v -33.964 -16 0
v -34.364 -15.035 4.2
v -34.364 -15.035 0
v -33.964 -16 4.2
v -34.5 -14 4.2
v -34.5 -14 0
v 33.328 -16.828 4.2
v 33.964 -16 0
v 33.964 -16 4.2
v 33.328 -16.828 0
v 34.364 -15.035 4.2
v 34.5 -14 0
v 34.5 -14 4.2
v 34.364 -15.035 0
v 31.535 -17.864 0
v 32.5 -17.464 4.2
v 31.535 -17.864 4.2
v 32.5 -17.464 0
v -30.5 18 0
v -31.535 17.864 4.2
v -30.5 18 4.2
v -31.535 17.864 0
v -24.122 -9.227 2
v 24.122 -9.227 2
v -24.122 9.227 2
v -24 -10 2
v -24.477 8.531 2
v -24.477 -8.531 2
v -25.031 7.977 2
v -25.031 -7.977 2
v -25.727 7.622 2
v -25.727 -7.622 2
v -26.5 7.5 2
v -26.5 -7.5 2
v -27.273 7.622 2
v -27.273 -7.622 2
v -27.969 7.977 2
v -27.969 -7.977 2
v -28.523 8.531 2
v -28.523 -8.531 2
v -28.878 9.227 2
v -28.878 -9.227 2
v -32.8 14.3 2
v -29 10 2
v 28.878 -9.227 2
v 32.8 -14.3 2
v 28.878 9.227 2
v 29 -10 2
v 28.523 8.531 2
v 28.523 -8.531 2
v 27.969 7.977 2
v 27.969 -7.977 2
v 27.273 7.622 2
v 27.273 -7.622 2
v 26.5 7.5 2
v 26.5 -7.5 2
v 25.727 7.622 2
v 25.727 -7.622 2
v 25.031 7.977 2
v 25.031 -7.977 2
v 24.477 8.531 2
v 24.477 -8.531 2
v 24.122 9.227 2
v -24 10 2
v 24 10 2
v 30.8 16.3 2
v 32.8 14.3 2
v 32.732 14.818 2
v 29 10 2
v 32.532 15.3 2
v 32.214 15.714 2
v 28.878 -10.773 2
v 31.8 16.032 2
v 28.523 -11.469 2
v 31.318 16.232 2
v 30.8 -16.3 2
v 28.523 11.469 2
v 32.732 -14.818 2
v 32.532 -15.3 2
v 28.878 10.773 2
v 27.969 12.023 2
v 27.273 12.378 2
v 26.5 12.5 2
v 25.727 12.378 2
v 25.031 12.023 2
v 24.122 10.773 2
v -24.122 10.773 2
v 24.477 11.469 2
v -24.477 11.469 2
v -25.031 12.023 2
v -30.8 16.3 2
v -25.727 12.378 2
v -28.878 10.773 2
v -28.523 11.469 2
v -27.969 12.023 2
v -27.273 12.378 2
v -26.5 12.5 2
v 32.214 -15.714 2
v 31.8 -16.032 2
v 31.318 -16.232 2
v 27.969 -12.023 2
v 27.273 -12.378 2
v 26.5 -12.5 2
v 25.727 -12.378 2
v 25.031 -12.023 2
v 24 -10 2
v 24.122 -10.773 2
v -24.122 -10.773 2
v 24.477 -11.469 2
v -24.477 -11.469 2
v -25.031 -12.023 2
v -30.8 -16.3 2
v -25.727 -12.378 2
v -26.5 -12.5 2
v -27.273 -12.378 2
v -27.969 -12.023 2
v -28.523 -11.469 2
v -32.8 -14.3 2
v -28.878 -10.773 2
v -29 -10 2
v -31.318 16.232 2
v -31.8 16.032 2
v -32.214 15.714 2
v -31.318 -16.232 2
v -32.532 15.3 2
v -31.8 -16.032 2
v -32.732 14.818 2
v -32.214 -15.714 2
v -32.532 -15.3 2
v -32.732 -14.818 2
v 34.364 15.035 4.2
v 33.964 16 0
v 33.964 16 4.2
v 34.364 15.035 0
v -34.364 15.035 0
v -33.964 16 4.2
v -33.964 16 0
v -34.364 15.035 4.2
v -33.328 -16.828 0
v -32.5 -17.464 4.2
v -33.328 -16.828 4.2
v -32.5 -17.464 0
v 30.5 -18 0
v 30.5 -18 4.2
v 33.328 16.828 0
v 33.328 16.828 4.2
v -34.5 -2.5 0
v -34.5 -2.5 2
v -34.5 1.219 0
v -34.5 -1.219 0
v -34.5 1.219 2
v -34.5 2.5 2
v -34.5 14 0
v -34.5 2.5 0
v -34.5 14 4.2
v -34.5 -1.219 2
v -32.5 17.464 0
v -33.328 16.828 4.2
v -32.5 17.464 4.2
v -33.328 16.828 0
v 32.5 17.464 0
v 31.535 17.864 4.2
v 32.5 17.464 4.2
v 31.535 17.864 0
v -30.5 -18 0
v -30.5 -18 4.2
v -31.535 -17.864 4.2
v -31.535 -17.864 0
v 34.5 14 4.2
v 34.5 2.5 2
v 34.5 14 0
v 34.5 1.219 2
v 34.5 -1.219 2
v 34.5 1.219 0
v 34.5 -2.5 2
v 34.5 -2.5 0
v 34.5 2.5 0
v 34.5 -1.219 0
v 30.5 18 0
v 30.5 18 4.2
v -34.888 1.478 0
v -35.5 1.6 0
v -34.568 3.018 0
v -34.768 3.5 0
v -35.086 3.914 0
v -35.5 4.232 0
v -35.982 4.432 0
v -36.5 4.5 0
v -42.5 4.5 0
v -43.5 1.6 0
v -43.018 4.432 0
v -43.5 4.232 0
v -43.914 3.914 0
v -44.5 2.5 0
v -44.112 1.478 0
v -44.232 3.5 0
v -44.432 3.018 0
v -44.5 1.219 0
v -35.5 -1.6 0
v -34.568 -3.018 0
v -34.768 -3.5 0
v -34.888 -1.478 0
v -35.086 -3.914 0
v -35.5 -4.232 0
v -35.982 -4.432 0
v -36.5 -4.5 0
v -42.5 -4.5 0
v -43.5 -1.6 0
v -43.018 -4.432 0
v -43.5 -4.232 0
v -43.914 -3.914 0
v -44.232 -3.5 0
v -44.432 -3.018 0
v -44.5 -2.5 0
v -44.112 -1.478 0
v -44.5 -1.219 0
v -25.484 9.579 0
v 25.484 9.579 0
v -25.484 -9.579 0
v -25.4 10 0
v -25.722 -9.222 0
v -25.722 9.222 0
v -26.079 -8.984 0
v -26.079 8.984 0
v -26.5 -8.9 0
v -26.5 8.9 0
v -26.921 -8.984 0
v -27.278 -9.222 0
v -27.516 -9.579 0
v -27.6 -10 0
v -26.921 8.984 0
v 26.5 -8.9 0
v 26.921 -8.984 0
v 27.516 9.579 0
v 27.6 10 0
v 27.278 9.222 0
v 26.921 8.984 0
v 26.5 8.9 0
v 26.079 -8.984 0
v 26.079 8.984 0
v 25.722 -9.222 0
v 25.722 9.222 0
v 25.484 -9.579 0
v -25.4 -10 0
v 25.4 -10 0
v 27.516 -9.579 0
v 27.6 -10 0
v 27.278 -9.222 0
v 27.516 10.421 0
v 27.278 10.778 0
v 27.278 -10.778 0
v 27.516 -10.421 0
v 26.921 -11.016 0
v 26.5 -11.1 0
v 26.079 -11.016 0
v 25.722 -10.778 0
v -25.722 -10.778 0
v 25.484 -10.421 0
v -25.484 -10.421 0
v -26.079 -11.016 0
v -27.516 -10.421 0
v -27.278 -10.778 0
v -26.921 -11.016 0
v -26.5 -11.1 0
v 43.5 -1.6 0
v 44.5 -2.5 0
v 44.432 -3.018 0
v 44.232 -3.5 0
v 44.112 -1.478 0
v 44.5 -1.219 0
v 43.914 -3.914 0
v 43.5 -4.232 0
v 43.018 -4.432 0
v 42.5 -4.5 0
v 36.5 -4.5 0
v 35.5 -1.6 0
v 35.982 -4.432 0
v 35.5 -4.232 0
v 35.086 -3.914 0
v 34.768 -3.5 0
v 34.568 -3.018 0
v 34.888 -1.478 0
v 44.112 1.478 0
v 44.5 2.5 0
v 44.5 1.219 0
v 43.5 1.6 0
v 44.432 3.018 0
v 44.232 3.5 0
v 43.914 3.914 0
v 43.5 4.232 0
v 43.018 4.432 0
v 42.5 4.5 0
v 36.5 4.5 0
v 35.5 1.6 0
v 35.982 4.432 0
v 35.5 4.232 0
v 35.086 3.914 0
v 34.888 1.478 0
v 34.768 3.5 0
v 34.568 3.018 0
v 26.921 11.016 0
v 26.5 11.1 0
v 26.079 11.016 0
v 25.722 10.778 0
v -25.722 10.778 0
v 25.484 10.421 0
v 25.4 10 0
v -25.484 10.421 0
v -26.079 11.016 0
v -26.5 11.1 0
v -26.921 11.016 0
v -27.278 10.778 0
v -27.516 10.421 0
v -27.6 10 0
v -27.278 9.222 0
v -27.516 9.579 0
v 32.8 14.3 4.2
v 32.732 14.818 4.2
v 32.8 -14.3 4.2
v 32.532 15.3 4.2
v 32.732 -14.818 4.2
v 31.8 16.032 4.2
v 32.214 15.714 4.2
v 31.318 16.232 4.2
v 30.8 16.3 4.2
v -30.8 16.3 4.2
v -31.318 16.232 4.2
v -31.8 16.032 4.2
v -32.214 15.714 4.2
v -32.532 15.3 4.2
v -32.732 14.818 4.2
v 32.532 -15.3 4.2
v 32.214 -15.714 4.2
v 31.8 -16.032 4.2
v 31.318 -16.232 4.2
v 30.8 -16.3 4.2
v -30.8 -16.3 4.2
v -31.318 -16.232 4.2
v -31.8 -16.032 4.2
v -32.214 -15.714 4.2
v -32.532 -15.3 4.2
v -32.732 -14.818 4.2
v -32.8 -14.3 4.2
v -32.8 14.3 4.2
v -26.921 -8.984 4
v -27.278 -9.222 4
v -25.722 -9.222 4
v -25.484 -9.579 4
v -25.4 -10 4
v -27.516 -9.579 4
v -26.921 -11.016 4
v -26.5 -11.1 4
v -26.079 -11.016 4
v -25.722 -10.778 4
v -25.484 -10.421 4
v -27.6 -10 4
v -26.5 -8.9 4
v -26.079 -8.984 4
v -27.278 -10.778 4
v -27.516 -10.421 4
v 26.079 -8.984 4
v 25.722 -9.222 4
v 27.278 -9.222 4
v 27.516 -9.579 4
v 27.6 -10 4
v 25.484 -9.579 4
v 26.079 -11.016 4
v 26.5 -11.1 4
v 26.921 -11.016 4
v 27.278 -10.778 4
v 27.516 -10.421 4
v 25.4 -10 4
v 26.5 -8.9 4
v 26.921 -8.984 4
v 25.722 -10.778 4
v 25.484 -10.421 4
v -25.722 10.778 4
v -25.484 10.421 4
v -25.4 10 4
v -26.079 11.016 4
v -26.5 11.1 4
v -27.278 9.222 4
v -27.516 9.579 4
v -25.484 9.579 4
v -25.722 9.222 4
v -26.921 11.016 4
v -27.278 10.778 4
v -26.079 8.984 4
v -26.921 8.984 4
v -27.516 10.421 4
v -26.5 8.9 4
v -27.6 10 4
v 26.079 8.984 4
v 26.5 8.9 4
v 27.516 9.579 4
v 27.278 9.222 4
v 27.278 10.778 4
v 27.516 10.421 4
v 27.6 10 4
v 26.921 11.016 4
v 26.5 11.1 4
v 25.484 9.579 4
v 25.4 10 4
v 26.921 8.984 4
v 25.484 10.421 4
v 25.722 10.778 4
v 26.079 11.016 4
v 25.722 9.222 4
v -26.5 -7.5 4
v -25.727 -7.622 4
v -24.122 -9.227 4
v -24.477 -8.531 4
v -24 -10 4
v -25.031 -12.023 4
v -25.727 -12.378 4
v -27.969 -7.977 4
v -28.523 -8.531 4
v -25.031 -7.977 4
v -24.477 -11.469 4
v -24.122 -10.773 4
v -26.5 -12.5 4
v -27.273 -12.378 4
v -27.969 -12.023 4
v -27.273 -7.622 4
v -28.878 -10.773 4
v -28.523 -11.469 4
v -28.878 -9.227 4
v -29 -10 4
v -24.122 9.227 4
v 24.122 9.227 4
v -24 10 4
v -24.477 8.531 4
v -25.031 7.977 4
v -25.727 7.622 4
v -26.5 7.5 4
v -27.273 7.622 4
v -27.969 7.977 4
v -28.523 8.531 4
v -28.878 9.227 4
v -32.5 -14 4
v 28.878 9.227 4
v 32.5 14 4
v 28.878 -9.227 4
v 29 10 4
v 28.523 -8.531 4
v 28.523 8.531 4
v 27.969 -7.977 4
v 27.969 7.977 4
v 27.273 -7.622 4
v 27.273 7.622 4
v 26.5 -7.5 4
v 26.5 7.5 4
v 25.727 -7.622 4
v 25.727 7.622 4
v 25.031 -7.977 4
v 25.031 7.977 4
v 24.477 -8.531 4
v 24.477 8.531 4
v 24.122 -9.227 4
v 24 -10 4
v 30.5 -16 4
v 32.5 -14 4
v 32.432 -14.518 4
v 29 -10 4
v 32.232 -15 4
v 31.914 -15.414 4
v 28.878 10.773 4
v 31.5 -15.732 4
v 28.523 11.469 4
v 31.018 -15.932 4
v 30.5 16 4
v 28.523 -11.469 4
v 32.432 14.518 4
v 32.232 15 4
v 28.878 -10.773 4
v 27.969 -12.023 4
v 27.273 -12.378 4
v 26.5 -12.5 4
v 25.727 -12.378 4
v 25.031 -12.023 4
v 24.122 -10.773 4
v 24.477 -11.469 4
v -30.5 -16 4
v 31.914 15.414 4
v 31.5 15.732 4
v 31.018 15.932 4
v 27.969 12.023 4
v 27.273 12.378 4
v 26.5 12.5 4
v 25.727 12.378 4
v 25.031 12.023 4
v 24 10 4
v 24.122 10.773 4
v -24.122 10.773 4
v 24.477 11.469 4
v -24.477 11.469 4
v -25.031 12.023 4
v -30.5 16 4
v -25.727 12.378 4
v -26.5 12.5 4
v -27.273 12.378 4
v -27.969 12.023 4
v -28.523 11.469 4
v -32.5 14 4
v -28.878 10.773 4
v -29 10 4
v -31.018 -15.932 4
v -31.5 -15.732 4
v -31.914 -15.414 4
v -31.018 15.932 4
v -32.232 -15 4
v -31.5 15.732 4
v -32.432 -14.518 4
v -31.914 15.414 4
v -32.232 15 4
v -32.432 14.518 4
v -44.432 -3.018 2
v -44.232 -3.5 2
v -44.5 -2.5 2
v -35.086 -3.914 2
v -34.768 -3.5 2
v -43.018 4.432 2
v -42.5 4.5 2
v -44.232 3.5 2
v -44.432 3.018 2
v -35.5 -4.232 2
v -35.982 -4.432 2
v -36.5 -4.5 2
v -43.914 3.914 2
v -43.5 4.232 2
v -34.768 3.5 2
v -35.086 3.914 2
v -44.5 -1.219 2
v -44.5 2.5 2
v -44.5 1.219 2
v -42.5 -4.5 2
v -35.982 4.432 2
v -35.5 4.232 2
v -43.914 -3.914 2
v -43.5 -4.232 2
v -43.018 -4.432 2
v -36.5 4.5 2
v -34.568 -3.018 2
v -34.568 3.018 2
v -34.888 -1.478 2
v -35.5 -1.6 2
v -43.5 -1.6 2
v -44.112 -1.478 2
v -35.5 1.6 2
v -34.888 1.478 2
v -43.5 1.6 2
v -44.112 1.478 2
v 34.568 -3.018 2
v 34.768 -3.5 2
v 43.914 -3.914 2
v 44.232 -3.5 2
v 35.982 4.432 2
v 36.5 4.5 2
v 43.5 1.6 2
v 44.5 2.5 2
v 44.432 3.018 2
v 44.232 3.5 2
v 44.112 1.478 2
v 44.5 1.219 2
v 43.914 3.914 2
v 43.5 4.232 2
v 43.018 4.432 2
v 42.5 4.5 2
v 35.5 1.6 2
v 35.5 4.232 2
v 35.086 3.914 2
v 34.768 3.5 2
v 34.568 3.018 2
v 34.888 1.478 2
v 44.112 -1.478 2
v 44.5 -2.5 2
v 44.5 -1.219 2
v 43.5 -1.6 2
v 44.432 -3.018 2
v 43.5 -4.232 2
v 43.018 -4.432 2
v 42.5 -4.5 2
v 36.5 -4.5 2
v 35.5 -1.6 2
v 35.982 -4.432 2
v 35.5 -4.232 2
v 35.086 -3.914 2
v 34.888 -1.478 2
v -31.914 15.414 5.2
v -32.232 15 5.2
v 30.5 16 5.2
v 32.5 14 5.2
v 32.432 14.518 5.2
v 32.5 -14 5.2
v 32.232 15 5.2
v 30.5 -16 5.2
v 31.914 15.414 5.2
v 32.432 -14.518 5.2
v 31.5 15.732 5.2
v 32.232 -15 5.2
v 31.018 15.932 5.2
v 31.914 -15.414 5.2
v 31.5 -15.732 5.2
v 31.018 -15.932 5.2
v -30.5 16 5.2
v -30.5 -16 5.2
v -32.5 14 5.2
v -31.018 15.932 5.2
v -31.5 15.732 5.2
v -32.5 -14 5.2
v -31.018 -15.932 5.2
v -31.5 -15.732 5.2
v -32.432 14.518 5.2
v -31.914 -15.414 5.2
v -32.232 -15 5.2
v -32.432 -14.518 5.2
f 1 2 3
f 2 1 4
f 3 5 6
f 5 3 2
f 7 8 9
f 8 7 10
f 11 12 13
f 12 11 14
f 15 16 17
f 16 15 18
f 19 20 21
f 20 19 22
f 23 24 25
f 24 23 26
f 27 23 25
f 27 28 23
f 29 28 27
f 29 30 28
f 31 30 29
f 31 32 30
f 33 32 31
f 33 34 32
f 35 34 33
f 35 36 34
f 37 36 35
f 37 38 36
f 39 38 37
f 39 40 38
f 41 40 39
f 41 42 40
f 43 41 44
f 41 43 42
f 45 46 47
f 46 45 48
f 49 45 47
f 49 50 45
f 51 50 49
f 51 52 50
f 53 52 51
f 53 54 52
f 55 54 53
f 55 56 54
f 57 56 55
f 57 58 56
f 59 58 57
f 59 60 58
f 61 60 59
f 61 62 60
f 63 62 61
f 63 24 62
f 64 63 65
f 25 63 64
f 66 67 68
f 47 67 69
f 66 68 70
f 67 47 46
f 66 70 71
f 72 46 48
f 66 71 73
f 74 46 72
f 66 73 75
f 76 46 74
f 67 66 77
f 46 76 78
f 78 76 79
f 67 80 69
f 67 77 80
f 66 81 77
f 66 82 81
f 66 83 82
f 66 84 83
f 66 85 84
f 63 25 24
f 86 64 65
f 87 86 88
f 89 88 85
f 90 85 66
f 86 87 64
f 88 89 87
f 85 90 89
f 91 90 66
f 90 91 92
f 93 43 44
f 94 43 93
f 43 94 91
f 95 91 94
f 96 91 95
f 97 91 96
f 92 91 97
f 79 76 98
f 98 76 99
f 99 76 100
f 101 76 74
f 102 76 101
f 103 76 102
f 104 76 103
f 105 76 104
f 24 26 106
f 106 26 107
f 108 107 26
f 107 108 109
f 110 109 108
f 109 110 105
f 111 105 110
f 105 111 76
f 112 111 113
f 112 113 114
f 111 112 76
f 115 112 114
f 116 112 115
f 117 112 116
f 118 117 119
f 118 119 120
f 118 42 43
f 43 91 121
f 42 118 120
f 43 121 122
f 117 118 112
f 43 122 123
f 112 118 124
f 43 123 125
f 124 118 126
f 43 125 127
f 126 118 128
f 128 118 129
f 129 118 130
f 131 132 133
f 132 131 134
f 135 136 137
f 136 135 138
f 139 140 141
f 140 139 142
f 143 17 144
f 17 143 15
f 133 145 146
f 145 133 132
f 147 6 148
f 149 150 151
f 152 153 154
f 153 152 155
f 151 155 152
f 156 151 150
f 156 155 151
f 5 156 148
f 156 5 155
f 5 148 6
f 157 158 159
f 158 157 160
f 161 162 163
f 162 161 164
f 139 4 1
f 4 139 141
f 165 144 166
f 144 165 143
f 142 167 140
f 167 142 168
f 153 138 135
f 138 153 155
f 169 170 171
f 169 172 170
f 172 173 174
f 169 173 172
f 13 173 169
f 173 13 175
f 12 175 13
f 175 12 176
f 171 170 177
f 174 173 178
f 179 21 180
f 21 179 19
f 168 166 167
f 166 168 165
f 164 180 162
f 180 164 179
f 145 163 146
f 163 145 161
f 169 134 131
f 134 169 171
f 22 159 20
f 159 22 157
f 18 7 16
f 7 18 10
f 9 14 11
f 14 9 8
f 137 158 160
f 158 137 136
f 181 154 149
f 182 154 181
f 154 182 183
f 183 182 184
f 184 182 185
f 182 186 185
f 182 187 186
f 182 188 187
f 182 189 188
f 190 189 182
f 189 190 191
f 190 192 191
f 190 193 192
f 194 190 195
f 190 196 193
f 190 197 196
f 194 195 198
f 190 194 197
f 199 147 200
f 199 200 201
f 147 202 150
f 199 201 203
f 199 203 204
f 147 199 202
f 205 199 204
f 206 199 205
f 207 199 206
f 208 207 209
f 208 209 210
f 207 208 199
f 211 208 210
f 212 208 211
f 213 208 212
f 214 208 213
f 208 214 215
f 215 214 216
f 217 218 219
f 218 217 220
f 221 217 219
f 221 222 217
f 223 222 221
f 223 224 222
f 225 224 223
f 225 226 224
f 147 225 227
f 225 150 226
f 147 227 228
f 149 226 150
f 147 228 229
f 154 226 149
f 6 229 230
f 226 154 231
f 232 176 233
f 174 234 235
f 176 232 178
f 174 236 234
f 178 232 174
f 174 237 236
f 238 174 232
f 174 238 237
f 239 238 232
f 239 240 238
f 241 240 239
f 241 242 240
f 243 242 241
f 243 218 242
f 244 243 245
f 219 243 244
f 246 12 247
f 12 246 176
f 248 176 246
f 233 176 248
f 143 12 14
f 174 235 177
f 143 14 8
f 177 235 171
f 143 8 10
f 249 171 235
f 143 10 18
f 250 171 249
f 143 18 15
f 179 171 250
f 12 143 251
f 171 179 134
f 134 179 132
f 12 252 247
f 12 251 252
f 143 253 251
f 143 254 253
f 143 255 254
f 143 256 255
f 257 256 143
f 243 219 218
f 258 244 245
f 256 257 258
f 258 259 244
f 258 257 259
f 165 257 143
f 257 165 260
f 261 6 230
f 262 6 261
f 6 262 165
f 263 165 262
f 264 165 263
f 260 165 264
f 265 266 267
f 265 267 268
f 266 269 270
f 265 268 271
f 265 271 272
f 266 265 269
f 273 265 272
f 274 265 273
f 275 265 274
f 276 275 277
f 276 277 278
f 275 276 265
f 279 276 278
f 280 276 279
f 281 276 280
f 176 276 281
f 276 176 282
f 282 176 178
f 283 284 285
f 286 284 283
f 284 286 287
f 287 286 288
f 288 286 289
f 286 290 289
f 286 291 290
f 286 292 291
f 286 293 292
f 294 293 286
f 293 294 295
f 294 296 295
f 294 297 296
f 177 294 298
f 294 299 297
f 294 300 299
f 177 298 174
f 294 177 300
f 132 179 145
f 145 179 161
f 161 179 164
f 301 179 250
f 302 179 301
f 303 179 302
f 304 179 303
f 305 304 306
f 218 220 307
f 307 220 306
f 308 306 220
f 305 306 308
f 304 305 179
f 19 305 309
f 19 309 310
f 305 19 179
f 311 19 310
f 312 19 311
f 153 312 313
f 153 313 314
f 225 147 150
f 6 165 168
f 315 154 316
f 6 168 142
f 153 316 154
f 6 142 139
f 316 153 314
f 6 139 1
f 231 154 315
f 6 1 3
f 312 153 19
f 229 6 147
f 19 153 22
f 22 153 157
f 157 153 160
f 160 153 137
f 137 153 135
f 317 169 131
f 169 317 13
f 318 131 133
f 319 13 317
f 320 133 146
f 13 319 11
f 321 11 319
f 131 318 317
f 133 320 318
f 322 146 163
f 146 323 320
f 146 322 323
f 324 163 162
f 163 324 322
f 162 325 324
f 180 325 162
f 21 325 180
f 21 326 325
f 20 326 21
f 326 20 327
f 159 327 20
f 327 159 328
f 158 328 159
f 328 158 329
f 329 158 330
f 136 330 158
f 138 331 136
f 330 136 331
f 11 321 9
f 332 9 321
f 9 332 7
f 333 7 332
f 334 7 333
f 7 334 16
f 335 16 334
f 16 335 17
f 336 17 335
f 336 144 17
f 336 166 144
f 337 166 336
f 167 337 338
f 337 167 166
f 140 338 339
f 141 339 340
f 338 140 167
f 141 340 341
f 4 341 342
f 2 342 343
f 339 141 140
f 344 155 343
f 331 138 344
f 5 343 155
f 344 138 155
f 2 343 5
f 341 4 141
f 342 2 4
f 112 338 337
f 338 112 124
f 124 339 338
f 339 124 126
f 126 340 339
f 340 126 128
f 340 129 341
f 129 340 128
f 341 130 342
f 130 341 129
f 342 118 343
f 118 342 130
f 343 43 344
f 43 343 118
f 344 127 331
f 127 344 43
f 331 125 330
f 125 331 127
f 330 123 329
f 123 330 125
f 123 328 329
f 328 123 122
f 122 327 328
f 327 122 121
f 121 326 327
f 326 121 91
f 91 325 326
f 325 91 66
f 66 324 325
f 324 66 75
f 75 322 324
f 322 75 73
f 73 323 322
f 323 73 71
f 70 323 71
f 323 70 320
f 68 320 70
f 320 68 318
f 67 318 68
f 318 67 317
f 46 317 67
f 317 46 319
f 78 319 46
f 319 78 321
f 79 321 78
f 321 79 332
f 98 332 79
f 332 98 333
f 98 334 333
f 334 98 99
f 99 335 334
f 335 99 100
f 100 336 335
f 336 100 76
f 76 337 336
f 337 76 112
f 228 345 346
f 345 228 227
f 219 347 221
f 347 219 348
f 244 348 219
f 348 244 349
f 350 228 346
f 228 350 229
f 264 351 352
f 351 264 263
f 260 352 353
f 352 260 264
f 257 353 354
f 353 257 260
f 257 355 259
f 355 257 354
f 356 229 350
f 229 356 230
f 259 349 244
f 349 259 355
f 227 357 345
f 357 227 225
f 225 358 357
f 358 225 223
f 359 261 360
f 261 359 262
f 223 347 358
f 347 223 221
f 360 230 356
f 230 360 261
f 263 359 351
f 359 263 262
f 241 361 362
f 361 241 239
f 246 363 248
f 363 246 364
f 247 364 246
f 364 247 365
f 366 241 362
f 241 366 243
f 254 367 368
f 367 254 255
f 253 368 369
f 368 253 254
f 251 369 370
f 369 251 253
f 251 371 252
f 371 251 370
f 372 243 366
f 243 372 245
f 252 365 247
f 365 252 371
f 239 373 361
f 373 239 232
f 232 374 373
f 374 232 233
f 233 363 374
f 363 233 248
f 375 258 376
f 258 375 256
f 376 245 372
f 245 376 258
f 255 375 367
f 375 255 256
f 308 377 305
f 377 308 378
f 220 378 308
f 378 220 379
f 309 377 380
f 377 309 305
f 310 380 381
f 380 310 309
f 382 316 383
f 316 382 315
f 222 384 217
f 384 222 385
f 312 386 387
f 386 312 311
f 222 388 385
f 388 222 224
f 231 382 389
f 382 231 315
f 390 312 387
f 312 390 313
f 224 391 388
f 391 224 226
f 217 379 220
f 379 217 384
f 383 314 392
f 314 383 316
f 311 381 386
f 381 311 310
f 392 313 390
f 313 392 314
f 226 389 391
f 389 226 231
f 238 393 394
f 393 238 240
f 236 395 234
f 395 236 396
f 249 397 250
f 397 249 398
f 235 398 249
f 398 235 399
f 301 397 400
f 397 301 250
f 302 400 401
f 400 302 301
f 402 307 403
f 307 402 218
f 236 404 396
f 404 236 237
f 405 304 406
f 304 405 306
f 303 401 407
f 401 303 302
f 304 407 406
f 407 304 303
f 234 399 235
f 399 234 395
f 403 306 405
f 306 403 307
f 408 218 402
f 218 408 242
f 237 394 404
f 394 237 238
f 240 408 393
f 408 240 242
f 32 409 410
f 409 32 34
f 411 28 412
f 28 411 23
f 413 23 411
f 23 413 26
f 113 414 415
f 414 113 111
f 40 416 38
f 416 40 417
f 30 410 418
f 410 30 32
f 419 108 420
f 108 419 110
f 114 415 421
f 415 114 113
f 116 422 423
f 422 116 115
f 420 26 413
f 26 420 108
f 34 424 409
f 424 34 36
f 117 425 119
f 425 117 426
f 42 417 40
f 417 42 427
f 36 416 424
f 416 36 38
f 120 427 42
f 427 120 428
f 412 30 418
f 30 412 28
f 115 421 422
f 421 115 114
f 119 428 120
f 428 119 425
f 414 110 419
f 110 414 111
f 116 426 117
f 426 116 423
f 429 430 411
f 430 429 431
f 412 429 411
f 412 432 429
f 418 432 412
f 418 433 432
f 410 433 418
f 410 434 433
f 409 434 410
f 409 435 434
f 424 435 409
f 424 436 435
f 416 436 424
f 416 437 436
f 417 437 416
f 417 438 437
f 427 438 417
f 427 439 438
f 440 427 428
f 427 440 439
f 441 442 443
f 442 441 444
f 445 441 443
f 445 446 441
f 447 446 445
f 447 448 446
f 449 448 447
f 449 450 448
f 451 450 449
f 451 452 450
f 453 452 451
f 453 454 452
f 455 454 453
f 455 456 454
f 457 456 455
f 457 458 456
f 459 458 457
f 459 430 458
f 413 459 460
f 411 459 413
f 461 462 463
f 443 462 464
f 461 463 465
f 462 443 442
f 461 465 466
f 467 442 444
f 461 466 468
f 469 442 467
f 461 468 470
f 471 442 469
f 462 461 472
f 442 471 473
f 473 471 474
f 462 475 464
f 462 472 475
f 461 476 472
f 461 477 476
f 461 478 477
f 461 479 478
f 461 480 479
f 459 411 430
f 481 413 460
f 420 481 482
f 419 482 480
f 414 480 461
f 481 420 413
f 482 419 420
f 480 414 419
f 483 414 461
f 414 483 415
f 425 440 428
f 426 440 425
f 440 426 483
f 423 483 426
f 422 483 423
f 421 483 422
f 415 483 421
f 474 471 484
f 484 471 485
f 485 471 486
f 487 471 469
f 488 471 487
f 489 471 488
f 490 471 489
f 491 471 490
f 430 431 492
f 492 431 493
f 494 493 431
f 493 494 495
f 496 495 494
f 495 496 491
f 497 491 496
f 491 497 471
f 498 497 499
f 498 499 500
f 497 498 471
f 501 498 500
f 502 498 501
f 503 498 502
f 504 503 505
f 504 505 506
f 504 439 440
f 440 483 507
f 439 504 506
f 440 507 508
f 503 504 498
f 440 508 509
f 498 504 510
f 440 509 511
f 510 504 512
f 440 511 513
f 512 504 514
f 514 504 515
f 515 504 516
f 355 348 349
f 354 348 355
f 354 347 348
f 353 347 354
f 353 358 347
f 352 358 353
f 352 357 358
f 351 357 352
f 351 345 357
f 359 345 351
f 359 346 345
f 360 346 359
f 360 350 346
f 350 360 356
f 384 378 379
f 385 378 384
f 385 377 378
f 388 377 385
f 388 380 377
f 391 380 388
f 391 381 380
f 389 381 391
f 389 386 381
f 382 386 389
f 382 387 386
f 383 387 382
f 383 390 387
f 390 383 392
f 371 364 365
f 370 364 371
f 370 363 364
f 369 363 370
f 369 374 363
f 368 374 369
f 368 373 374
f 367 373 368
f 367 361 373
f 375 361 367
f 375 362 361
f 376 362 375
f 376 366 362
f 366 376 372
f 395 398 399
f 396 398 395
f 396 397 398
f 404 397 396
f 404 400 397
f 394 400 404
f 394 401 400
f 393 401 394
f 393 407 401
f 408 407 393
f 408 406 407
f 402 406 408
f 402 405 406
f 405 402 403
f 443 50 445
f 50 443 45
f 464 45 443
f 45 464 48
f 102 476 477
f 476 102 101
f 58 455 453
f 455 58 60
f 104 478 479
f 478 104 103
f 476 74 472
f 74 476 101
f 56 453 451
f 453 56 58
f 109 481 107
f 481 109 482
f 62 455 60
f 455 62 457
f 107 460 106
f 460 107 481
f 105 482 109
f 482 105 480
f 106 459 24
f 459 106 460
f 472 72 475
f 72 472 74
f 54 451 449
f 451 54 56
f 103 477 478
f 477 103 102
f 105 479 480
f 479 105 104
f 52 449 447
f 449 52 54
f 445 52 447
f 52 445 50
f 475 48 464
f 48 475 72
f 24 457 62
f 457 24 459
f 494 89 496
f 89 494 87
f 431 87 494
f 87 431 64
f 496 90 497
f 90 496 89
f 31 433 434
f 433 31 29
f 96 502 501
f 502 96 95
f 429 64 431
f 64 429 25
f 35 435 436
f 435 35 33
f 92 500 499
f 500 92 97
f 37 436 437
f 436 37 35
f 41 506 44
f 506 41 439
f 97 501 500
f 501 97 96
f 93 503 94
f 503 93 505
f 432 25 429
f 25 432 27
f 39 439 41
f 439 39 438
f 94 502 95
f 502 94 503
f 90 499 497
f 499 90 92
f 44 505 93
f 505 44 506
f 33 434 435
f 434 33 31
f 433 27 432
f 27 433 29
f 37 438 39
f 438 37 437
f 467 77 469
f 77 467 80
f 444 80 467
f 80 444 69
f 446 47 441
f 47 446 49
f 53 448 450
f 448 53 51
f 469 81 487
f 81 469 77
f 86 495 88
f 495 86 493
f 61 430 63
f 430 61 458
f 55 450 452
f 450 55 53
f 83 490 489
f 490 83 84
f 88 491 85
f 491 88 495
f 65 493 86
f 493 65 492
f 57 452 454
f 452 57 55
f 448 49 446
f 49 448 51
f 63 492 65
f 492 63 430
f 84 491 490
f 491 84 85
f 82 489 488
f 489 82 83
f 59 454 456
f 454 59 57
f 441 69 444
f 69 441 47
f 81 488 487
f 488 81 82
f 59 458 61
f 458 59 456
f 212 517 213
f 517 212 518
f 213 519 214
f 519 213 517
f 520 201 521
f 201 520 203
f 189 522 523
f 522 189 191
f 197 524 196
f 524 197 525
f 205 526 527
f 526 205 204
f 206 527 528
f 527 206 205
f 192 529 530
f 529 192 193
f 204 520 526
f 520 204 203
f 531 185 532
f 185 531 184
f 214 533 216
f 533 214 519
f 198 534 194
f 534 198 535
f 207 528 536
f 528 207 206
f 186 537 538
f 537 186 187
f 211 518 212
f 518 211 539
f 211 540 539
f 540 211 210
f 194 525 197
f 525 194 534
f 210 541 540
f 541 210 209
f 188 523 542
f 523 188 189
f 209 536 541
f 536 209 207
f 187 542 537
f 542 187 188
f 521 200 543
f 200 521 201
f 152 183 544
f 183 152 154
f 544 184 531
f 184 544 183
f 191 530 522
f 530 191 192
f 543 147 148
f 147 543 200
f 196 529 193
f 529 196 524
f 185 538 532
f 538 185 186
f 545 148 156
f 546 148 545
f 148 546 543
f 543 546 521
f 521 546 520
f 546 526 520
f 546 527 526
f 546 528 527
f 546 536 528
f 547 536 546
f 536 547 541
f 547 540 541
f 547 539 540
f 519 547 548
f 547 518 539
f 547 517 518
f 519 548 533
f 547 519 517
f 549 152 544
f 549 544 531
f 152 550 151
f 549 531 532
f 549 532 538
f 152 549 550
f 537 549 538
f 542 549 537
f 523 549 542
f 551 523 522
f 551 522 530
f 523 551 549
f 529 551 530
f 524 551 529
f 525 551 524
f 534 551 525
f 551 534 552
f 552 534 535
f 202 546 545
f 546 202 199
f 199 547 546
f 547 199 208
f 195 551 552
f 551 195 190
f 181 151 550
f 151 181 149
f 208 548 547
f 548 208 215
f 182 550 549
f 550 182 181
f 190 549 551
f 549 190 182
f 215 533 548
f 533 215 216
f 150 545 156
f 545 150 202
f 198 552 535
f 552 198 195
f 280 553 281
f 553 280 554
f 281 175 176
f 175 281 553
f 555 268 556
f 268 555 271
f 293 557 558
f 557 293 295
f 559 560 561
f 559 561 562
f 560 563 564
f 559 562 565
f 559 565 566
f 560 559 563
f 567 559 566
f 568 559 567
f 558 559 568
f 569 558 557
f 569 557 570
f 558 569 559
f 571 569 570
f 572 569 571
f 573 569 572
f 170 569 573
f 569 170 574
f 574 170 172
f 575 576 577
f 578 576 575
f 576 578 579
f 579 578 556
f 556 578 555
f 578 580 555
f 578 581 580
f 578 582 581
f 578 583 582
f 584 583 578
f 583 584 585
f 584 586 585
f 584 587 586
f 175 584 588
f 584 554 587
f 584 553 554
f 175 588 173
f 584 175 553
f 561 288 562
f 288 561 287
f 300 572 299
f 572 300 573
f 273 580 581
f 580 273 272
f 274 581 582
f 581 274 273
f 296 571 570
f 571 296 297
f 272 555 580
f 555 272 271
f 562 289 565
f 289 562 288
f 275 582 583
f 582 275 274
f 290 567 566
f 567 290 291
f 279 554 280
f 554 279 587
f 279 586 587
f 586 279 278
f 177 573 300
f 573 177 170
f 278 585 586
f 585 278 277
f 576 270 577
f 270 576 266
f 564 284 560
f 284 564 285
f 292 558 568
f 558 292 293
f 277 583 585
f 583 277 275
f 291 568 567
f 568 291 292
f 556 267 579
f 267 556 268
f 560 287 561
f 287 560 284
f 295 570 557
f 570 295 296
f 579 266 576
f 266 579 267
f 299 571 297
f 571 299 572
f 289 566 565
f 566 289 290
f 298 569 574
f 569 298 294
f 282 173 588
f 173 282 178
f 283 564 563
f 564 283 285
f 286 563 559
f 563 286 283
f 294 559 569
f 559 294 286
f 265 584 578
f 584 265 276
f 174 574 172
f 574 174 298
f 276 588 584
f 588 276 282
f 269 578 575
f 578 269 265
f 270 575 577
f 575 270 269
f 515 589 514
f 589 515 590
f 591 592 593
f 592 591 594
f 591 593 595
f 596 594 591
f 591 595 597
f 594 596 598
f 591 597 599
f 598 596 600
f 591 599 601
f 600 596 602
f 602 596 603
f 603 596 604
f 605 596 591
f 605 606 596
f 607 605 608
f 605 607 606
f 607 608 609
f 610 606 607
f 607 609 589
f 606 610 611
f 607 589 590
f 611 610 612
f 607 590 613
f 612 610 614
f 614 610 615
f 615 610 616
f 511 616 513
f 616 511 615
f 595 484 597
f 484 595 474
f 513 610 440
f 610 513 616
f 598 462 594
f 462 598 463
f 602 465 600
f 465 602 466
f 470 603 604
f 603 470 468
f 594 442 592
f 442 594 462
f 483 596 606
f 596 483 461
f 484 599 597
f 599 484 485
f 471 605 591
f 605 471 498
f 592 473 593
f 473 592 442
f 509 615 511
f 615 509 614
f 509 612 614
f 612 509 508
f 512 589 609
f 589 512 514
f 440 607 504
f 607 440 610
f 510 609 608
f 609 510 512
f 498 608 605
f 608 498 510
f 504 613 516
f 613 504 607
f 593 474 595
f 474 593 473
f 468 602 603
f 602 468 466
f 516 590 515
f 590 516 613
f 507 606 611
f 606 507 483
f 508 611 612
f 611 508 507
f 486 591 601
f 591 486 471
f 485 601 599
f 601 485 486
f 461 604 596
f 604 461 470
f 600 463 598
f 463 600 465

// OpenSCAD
// ============================================================================
// Orange Pi Zero 3W 载板 / 托架  —  参数化 OpenSCAD 源
// ============================================================================
// 性质: 本仓"从零自建"的新零件, 不修改 fanhao375/microduck-replica-cad 的
//       原始 SolidWorks/STEP (本机也无 SW/FreeCAD). 输出 .scad -> OpenSCAD 渲染 -> STL 可打印.
//
// 板尺寸来源: 香橙派官网参数页 (orangepi.cn/.../Orange-Pi-Zero-3W.html)
//   PCB 65 x 32 x 1.2 mm. 英文详情页有一处写 "30mm x 65mm", 以参数页 65x32 为准,
//   该 2mm 差异列为待核对项.
//
// 用途: 替代飞特版 (v2.2) 原本按 Raspberry Pi Zero 2W 做的机内托架, 把 Orange Pi
//       Zero 3W (A733) 固定到 MicroDuck 机身. 飞特版原托架按 RPi 引脚/板型建模,
//       与 Orange Pi 不兼容, 故重建.
//
// 重要接口警告 (已反复确认):
//   Orange Pi 的 40-pin 不是 Raspberry Pi 引脚定义 -> 之前方案里的 "RPi 形态 HAT
//   (kissqy / DuckBuddy)" 在引脚上不 drop-in. 这块载板按 "直接固定 + 飞线/转接载板"
//   思路做, 不预设原 HAT 能插上. 是否保留 HAT 由后续硬件决策定.
//
// 待核对 / 待定 (改前必须确认, 见文件末尾 CHECKLIST):
//   1. 板角倒圆半径 BOARD_R (官网未给, 暂估 2.0)
//   2. 真实安装孔位 (本件用四角内缩支柱, 非官方孔位; Pi Zero 兼容孔位待核)
//   3. 载板与机身的螺接接口 (lugs 位置/数量) 需对照飞特版躯干结构 STEP 后定
//   4. 各接插件 (Mini HDMI / USB-C / TF / CSI FPC / PCIe FPC / 风扇) 的精确位置
// ============================================================================

// ---------- 板参数 (官方, 已核对) ----------
BOARD_L = 65.0;   // X 方向长度 mm
BOARD_W = 32.0;   // Y 方向宽度 mm
BOARD_T = 1.2;    // 板厚 mm
BOARD_R = 2.0;    // 板角倒圆 (估算, 待核对官方顶视图)

// ---------- 载板参数 (可调) ----------
wall    = 2.0;    // 边框壁厚
base_t  = 2.0;    // 底板厚
rail_h  = BOARD_T + 1.0;  // 定位边轨高 (仅包住板边, 不挡顶部接插件)
stand_h = 2.0;    // 支柱高 (板底离底板)
screw_d = 2.2;    // M2 通孔直径 (间隙)
tol     = 0.3;    // 板与框配合间隙

// 坐标系: 板中心在原点 (rounded_rect 以原点为中心), 故 standoffs/lugs 用 ±半宽.
// 支柱位置: 四角内缩 6mm. 真实安装孔位待核对 (Pi Zero 兼容 or 官方顶视图)
standoffs = [
  [ -(BOARD_L/2 - 6.0), -(BOARD_W/2 - 6.0) ],
  [  (BOARD_L/2 - 6.0), -(BOARD_W/2 - 6.0) ],
  [ -(BOARD_L/2 - 6.0),  (BOARD_W/2 - 6.0) ],
  [  (BOARD_L/2 - 6.0),  (BOARD_W/2 - 6.0) ]
];

// 与机身连接耳: 左右伸出, 居中 (y=0). 通用可调耳 —— 长圆孔沿 x 方向 ±lug_slot/2 调节,
// 装机时微调后用 M3 螺丝或扎带固定到飞特版躯干. 精确螺接位待拉 418MB STEP 确认.
lug_d     = 3.2;   // M3 孔
lug_slot  = 8.0;   // 长圆孔长度 (x 方向调节量 ±4mm)
lug_w     = 9.0;   // 耳宽 (y 方向)
lug_ext   = 10.0;  // 耳伸出底板外的长度 (x)
lugs = [
  [ -(BOARD_L/2 + wall + lug_ext/2), 0 ],
  [  (BOARD_L/2 + wall + lug_ext/2), 0 ]
];

// ---------- 基础形状 ----------
module rounded_rect(l, w, r) {
  r2 = min(r, min(l, w) / 2 - 0.01);
  hull() {
    for (x = [-1, 1]) for (y = [-1, 1])
      translate([x * (l/2 - r2), y * (w/2 - r2)]) circle(r = r2, $fn = 24);
  }
}

// 仅作装配参考, 不打印
module board_ref() {
  color("lime") translate([0, 0, base_t + stand_h])
    linear_extrude(BOARD_T) rounded_rect(BOARD_L, BOARD_W, BOARD_R);
}

// 长圆孔 (2D): 沿 x 方向, 中心 (x,y), 长度 len, 宽 d
module slot_2d(x, y, len, d) {
  hull() {
    translate([x - len/2, y]) circle(d = d, $fn = 16);
    translate([x + len/2, y]) circle(d = d, $fn = 16);
  }
}

// 连接耳: 矩形耳 + 长圆孔, 沿 x 方向可调
module lug_ear(g) {
  x = g[0]; y = g[1];
  difference() {
    linear_extrude(base_t) translate([x, y, 0]) rounded_rect(lug_ext, lug_w, 2.0);
    linear_extrude(base_t + 0.2) slot_2d(x, y, lug_slot, lug_d);
  }
}

// ---------- 载板主体 ----------
module carrier() {
  // 底板 + 定位边轨 (开顶, 板从上方落入, 不挡接插件)
  difference() {
    union() {
      linear_extrude(base_t) rounded_rect(BOARD_L + 2*wall, BOARD_W + 2*wall, BOARD_R + wall);
      translate([0, 0, base_t]) linear_extrude(rail_h)
        difference() {
          rounded_rect(BOARD_L + 2*wall, BOARD_W + 2*wall, BOARD_R + wall);
          rounded_rect(BOARD_L + 2*tol, BOARD_W + 2*tol, BOARD_R);
        }
    }
    // 支柱 M2 通孔
    for (s = standoffs)
      translate([s[0], s[1], -0.1]) cylinder(d = screw_d, h = base_t + stand_h + 0.2, $fn = 16);
  }
  // 支柱实体 (带通孔)
  for (s = standoffs)
    difference() {
      translate([s[0], s[1], base_t]) cylinder(d = 5.0, h = stand_h, $fn = 20);
      translate([s[0], s[1], base_t - 0.1]) cylinder(d = screw_d, h = stand_h + 0.2, $fn = 16);
    }
  // 连接耳实体 (通用长圆孔耳, 沿 x 方向可调)
  for (g = lugs) lug_ear(g);
}

// ---------- 预览 ----------
carrier();
board_ref();

// ============================================================================
// CHECKLIST — 打印 / 装机前必须核对 (逐项填实后再出 STL)
// ----------------------------------------------------------------------------
// [ ] 1. BOARD_R: 打开官网 "产品详细图 / 正面视图", 量板四角倒圆半径, 改 BOARD_R.
// [ ] 2. 安装孔: 第三方评测确认 Orange Pi Zero 3W 与 Pi Zero 2W "identical hole spacing" (孔距一致),
//        板宽仅差 2mm (65x32 vs 65x30). 作者 CAD 的板模型是 Pi Zero 板型 (实机 Radxa Zero 3W).
//        => 机械层大概率免改; 本载板仅在 trunk_base 卡位放不下 32mm 板时才需要.
//        若要用真实孔位: 把 standoffs 改到 Pi Zero 四孔坐标, 并确认 Orange Pi 孔数/孔径 (待实物核).
//        无孔时当前四角摩擦+支柱方案可用, 但需实测紧固.
// [ ] 3. 机身接口: 连接耳已改为通用长圆孔耳 (沿 x 方向 ±4mm 可调, M3 或扎带固定), 不依赖精确螺接位即可打样.
//        若要定准: 拉取 fanhao375/microduck-replica-cad Releases 的 SolidWorks-FT2026-10-20.zip,
//        读原 RPi 托架的螺接位, 把 lugs 位置/数量/孔径对齐, 使本载板精确拧到飞特版躯干.
// [ ] 4. 接插件禁布: 若后续要加侧开口 (Mini HDMI/USB-C/TF/CSI/PCIe), 依官方顶视图补 cutout,
//        位置坐标填到对应 translate 处.
// [ ] 5. HAT 决策(真正的不兼容在电气层, 不在机械): Orange Pi 40-pin 定义 != RPi => 树莓派机器人HAT
//        不能直插. 三条出路见 docs/hardware/microduck-飞特版3D打印件-OrangePi适配清单-2026-11-06.md §3:
//        A 主板改回 Radxa Zero 3W (与作者 CAD 完全对齐, 零机械改动) / B 重做 HAT 接口 / C 绕开 HAT
//        用 URT2 + imu_to_dxl 小板. 选 A 则本载板不需要; 选 B/C 则本载板直接固定 Orange Pi.
// 渲染: OpenSCAD 打开本文件 -> Design -> Render -> Export STL. 无需本机装 CAD 即可由你本地渲染.
// ============================================================================
